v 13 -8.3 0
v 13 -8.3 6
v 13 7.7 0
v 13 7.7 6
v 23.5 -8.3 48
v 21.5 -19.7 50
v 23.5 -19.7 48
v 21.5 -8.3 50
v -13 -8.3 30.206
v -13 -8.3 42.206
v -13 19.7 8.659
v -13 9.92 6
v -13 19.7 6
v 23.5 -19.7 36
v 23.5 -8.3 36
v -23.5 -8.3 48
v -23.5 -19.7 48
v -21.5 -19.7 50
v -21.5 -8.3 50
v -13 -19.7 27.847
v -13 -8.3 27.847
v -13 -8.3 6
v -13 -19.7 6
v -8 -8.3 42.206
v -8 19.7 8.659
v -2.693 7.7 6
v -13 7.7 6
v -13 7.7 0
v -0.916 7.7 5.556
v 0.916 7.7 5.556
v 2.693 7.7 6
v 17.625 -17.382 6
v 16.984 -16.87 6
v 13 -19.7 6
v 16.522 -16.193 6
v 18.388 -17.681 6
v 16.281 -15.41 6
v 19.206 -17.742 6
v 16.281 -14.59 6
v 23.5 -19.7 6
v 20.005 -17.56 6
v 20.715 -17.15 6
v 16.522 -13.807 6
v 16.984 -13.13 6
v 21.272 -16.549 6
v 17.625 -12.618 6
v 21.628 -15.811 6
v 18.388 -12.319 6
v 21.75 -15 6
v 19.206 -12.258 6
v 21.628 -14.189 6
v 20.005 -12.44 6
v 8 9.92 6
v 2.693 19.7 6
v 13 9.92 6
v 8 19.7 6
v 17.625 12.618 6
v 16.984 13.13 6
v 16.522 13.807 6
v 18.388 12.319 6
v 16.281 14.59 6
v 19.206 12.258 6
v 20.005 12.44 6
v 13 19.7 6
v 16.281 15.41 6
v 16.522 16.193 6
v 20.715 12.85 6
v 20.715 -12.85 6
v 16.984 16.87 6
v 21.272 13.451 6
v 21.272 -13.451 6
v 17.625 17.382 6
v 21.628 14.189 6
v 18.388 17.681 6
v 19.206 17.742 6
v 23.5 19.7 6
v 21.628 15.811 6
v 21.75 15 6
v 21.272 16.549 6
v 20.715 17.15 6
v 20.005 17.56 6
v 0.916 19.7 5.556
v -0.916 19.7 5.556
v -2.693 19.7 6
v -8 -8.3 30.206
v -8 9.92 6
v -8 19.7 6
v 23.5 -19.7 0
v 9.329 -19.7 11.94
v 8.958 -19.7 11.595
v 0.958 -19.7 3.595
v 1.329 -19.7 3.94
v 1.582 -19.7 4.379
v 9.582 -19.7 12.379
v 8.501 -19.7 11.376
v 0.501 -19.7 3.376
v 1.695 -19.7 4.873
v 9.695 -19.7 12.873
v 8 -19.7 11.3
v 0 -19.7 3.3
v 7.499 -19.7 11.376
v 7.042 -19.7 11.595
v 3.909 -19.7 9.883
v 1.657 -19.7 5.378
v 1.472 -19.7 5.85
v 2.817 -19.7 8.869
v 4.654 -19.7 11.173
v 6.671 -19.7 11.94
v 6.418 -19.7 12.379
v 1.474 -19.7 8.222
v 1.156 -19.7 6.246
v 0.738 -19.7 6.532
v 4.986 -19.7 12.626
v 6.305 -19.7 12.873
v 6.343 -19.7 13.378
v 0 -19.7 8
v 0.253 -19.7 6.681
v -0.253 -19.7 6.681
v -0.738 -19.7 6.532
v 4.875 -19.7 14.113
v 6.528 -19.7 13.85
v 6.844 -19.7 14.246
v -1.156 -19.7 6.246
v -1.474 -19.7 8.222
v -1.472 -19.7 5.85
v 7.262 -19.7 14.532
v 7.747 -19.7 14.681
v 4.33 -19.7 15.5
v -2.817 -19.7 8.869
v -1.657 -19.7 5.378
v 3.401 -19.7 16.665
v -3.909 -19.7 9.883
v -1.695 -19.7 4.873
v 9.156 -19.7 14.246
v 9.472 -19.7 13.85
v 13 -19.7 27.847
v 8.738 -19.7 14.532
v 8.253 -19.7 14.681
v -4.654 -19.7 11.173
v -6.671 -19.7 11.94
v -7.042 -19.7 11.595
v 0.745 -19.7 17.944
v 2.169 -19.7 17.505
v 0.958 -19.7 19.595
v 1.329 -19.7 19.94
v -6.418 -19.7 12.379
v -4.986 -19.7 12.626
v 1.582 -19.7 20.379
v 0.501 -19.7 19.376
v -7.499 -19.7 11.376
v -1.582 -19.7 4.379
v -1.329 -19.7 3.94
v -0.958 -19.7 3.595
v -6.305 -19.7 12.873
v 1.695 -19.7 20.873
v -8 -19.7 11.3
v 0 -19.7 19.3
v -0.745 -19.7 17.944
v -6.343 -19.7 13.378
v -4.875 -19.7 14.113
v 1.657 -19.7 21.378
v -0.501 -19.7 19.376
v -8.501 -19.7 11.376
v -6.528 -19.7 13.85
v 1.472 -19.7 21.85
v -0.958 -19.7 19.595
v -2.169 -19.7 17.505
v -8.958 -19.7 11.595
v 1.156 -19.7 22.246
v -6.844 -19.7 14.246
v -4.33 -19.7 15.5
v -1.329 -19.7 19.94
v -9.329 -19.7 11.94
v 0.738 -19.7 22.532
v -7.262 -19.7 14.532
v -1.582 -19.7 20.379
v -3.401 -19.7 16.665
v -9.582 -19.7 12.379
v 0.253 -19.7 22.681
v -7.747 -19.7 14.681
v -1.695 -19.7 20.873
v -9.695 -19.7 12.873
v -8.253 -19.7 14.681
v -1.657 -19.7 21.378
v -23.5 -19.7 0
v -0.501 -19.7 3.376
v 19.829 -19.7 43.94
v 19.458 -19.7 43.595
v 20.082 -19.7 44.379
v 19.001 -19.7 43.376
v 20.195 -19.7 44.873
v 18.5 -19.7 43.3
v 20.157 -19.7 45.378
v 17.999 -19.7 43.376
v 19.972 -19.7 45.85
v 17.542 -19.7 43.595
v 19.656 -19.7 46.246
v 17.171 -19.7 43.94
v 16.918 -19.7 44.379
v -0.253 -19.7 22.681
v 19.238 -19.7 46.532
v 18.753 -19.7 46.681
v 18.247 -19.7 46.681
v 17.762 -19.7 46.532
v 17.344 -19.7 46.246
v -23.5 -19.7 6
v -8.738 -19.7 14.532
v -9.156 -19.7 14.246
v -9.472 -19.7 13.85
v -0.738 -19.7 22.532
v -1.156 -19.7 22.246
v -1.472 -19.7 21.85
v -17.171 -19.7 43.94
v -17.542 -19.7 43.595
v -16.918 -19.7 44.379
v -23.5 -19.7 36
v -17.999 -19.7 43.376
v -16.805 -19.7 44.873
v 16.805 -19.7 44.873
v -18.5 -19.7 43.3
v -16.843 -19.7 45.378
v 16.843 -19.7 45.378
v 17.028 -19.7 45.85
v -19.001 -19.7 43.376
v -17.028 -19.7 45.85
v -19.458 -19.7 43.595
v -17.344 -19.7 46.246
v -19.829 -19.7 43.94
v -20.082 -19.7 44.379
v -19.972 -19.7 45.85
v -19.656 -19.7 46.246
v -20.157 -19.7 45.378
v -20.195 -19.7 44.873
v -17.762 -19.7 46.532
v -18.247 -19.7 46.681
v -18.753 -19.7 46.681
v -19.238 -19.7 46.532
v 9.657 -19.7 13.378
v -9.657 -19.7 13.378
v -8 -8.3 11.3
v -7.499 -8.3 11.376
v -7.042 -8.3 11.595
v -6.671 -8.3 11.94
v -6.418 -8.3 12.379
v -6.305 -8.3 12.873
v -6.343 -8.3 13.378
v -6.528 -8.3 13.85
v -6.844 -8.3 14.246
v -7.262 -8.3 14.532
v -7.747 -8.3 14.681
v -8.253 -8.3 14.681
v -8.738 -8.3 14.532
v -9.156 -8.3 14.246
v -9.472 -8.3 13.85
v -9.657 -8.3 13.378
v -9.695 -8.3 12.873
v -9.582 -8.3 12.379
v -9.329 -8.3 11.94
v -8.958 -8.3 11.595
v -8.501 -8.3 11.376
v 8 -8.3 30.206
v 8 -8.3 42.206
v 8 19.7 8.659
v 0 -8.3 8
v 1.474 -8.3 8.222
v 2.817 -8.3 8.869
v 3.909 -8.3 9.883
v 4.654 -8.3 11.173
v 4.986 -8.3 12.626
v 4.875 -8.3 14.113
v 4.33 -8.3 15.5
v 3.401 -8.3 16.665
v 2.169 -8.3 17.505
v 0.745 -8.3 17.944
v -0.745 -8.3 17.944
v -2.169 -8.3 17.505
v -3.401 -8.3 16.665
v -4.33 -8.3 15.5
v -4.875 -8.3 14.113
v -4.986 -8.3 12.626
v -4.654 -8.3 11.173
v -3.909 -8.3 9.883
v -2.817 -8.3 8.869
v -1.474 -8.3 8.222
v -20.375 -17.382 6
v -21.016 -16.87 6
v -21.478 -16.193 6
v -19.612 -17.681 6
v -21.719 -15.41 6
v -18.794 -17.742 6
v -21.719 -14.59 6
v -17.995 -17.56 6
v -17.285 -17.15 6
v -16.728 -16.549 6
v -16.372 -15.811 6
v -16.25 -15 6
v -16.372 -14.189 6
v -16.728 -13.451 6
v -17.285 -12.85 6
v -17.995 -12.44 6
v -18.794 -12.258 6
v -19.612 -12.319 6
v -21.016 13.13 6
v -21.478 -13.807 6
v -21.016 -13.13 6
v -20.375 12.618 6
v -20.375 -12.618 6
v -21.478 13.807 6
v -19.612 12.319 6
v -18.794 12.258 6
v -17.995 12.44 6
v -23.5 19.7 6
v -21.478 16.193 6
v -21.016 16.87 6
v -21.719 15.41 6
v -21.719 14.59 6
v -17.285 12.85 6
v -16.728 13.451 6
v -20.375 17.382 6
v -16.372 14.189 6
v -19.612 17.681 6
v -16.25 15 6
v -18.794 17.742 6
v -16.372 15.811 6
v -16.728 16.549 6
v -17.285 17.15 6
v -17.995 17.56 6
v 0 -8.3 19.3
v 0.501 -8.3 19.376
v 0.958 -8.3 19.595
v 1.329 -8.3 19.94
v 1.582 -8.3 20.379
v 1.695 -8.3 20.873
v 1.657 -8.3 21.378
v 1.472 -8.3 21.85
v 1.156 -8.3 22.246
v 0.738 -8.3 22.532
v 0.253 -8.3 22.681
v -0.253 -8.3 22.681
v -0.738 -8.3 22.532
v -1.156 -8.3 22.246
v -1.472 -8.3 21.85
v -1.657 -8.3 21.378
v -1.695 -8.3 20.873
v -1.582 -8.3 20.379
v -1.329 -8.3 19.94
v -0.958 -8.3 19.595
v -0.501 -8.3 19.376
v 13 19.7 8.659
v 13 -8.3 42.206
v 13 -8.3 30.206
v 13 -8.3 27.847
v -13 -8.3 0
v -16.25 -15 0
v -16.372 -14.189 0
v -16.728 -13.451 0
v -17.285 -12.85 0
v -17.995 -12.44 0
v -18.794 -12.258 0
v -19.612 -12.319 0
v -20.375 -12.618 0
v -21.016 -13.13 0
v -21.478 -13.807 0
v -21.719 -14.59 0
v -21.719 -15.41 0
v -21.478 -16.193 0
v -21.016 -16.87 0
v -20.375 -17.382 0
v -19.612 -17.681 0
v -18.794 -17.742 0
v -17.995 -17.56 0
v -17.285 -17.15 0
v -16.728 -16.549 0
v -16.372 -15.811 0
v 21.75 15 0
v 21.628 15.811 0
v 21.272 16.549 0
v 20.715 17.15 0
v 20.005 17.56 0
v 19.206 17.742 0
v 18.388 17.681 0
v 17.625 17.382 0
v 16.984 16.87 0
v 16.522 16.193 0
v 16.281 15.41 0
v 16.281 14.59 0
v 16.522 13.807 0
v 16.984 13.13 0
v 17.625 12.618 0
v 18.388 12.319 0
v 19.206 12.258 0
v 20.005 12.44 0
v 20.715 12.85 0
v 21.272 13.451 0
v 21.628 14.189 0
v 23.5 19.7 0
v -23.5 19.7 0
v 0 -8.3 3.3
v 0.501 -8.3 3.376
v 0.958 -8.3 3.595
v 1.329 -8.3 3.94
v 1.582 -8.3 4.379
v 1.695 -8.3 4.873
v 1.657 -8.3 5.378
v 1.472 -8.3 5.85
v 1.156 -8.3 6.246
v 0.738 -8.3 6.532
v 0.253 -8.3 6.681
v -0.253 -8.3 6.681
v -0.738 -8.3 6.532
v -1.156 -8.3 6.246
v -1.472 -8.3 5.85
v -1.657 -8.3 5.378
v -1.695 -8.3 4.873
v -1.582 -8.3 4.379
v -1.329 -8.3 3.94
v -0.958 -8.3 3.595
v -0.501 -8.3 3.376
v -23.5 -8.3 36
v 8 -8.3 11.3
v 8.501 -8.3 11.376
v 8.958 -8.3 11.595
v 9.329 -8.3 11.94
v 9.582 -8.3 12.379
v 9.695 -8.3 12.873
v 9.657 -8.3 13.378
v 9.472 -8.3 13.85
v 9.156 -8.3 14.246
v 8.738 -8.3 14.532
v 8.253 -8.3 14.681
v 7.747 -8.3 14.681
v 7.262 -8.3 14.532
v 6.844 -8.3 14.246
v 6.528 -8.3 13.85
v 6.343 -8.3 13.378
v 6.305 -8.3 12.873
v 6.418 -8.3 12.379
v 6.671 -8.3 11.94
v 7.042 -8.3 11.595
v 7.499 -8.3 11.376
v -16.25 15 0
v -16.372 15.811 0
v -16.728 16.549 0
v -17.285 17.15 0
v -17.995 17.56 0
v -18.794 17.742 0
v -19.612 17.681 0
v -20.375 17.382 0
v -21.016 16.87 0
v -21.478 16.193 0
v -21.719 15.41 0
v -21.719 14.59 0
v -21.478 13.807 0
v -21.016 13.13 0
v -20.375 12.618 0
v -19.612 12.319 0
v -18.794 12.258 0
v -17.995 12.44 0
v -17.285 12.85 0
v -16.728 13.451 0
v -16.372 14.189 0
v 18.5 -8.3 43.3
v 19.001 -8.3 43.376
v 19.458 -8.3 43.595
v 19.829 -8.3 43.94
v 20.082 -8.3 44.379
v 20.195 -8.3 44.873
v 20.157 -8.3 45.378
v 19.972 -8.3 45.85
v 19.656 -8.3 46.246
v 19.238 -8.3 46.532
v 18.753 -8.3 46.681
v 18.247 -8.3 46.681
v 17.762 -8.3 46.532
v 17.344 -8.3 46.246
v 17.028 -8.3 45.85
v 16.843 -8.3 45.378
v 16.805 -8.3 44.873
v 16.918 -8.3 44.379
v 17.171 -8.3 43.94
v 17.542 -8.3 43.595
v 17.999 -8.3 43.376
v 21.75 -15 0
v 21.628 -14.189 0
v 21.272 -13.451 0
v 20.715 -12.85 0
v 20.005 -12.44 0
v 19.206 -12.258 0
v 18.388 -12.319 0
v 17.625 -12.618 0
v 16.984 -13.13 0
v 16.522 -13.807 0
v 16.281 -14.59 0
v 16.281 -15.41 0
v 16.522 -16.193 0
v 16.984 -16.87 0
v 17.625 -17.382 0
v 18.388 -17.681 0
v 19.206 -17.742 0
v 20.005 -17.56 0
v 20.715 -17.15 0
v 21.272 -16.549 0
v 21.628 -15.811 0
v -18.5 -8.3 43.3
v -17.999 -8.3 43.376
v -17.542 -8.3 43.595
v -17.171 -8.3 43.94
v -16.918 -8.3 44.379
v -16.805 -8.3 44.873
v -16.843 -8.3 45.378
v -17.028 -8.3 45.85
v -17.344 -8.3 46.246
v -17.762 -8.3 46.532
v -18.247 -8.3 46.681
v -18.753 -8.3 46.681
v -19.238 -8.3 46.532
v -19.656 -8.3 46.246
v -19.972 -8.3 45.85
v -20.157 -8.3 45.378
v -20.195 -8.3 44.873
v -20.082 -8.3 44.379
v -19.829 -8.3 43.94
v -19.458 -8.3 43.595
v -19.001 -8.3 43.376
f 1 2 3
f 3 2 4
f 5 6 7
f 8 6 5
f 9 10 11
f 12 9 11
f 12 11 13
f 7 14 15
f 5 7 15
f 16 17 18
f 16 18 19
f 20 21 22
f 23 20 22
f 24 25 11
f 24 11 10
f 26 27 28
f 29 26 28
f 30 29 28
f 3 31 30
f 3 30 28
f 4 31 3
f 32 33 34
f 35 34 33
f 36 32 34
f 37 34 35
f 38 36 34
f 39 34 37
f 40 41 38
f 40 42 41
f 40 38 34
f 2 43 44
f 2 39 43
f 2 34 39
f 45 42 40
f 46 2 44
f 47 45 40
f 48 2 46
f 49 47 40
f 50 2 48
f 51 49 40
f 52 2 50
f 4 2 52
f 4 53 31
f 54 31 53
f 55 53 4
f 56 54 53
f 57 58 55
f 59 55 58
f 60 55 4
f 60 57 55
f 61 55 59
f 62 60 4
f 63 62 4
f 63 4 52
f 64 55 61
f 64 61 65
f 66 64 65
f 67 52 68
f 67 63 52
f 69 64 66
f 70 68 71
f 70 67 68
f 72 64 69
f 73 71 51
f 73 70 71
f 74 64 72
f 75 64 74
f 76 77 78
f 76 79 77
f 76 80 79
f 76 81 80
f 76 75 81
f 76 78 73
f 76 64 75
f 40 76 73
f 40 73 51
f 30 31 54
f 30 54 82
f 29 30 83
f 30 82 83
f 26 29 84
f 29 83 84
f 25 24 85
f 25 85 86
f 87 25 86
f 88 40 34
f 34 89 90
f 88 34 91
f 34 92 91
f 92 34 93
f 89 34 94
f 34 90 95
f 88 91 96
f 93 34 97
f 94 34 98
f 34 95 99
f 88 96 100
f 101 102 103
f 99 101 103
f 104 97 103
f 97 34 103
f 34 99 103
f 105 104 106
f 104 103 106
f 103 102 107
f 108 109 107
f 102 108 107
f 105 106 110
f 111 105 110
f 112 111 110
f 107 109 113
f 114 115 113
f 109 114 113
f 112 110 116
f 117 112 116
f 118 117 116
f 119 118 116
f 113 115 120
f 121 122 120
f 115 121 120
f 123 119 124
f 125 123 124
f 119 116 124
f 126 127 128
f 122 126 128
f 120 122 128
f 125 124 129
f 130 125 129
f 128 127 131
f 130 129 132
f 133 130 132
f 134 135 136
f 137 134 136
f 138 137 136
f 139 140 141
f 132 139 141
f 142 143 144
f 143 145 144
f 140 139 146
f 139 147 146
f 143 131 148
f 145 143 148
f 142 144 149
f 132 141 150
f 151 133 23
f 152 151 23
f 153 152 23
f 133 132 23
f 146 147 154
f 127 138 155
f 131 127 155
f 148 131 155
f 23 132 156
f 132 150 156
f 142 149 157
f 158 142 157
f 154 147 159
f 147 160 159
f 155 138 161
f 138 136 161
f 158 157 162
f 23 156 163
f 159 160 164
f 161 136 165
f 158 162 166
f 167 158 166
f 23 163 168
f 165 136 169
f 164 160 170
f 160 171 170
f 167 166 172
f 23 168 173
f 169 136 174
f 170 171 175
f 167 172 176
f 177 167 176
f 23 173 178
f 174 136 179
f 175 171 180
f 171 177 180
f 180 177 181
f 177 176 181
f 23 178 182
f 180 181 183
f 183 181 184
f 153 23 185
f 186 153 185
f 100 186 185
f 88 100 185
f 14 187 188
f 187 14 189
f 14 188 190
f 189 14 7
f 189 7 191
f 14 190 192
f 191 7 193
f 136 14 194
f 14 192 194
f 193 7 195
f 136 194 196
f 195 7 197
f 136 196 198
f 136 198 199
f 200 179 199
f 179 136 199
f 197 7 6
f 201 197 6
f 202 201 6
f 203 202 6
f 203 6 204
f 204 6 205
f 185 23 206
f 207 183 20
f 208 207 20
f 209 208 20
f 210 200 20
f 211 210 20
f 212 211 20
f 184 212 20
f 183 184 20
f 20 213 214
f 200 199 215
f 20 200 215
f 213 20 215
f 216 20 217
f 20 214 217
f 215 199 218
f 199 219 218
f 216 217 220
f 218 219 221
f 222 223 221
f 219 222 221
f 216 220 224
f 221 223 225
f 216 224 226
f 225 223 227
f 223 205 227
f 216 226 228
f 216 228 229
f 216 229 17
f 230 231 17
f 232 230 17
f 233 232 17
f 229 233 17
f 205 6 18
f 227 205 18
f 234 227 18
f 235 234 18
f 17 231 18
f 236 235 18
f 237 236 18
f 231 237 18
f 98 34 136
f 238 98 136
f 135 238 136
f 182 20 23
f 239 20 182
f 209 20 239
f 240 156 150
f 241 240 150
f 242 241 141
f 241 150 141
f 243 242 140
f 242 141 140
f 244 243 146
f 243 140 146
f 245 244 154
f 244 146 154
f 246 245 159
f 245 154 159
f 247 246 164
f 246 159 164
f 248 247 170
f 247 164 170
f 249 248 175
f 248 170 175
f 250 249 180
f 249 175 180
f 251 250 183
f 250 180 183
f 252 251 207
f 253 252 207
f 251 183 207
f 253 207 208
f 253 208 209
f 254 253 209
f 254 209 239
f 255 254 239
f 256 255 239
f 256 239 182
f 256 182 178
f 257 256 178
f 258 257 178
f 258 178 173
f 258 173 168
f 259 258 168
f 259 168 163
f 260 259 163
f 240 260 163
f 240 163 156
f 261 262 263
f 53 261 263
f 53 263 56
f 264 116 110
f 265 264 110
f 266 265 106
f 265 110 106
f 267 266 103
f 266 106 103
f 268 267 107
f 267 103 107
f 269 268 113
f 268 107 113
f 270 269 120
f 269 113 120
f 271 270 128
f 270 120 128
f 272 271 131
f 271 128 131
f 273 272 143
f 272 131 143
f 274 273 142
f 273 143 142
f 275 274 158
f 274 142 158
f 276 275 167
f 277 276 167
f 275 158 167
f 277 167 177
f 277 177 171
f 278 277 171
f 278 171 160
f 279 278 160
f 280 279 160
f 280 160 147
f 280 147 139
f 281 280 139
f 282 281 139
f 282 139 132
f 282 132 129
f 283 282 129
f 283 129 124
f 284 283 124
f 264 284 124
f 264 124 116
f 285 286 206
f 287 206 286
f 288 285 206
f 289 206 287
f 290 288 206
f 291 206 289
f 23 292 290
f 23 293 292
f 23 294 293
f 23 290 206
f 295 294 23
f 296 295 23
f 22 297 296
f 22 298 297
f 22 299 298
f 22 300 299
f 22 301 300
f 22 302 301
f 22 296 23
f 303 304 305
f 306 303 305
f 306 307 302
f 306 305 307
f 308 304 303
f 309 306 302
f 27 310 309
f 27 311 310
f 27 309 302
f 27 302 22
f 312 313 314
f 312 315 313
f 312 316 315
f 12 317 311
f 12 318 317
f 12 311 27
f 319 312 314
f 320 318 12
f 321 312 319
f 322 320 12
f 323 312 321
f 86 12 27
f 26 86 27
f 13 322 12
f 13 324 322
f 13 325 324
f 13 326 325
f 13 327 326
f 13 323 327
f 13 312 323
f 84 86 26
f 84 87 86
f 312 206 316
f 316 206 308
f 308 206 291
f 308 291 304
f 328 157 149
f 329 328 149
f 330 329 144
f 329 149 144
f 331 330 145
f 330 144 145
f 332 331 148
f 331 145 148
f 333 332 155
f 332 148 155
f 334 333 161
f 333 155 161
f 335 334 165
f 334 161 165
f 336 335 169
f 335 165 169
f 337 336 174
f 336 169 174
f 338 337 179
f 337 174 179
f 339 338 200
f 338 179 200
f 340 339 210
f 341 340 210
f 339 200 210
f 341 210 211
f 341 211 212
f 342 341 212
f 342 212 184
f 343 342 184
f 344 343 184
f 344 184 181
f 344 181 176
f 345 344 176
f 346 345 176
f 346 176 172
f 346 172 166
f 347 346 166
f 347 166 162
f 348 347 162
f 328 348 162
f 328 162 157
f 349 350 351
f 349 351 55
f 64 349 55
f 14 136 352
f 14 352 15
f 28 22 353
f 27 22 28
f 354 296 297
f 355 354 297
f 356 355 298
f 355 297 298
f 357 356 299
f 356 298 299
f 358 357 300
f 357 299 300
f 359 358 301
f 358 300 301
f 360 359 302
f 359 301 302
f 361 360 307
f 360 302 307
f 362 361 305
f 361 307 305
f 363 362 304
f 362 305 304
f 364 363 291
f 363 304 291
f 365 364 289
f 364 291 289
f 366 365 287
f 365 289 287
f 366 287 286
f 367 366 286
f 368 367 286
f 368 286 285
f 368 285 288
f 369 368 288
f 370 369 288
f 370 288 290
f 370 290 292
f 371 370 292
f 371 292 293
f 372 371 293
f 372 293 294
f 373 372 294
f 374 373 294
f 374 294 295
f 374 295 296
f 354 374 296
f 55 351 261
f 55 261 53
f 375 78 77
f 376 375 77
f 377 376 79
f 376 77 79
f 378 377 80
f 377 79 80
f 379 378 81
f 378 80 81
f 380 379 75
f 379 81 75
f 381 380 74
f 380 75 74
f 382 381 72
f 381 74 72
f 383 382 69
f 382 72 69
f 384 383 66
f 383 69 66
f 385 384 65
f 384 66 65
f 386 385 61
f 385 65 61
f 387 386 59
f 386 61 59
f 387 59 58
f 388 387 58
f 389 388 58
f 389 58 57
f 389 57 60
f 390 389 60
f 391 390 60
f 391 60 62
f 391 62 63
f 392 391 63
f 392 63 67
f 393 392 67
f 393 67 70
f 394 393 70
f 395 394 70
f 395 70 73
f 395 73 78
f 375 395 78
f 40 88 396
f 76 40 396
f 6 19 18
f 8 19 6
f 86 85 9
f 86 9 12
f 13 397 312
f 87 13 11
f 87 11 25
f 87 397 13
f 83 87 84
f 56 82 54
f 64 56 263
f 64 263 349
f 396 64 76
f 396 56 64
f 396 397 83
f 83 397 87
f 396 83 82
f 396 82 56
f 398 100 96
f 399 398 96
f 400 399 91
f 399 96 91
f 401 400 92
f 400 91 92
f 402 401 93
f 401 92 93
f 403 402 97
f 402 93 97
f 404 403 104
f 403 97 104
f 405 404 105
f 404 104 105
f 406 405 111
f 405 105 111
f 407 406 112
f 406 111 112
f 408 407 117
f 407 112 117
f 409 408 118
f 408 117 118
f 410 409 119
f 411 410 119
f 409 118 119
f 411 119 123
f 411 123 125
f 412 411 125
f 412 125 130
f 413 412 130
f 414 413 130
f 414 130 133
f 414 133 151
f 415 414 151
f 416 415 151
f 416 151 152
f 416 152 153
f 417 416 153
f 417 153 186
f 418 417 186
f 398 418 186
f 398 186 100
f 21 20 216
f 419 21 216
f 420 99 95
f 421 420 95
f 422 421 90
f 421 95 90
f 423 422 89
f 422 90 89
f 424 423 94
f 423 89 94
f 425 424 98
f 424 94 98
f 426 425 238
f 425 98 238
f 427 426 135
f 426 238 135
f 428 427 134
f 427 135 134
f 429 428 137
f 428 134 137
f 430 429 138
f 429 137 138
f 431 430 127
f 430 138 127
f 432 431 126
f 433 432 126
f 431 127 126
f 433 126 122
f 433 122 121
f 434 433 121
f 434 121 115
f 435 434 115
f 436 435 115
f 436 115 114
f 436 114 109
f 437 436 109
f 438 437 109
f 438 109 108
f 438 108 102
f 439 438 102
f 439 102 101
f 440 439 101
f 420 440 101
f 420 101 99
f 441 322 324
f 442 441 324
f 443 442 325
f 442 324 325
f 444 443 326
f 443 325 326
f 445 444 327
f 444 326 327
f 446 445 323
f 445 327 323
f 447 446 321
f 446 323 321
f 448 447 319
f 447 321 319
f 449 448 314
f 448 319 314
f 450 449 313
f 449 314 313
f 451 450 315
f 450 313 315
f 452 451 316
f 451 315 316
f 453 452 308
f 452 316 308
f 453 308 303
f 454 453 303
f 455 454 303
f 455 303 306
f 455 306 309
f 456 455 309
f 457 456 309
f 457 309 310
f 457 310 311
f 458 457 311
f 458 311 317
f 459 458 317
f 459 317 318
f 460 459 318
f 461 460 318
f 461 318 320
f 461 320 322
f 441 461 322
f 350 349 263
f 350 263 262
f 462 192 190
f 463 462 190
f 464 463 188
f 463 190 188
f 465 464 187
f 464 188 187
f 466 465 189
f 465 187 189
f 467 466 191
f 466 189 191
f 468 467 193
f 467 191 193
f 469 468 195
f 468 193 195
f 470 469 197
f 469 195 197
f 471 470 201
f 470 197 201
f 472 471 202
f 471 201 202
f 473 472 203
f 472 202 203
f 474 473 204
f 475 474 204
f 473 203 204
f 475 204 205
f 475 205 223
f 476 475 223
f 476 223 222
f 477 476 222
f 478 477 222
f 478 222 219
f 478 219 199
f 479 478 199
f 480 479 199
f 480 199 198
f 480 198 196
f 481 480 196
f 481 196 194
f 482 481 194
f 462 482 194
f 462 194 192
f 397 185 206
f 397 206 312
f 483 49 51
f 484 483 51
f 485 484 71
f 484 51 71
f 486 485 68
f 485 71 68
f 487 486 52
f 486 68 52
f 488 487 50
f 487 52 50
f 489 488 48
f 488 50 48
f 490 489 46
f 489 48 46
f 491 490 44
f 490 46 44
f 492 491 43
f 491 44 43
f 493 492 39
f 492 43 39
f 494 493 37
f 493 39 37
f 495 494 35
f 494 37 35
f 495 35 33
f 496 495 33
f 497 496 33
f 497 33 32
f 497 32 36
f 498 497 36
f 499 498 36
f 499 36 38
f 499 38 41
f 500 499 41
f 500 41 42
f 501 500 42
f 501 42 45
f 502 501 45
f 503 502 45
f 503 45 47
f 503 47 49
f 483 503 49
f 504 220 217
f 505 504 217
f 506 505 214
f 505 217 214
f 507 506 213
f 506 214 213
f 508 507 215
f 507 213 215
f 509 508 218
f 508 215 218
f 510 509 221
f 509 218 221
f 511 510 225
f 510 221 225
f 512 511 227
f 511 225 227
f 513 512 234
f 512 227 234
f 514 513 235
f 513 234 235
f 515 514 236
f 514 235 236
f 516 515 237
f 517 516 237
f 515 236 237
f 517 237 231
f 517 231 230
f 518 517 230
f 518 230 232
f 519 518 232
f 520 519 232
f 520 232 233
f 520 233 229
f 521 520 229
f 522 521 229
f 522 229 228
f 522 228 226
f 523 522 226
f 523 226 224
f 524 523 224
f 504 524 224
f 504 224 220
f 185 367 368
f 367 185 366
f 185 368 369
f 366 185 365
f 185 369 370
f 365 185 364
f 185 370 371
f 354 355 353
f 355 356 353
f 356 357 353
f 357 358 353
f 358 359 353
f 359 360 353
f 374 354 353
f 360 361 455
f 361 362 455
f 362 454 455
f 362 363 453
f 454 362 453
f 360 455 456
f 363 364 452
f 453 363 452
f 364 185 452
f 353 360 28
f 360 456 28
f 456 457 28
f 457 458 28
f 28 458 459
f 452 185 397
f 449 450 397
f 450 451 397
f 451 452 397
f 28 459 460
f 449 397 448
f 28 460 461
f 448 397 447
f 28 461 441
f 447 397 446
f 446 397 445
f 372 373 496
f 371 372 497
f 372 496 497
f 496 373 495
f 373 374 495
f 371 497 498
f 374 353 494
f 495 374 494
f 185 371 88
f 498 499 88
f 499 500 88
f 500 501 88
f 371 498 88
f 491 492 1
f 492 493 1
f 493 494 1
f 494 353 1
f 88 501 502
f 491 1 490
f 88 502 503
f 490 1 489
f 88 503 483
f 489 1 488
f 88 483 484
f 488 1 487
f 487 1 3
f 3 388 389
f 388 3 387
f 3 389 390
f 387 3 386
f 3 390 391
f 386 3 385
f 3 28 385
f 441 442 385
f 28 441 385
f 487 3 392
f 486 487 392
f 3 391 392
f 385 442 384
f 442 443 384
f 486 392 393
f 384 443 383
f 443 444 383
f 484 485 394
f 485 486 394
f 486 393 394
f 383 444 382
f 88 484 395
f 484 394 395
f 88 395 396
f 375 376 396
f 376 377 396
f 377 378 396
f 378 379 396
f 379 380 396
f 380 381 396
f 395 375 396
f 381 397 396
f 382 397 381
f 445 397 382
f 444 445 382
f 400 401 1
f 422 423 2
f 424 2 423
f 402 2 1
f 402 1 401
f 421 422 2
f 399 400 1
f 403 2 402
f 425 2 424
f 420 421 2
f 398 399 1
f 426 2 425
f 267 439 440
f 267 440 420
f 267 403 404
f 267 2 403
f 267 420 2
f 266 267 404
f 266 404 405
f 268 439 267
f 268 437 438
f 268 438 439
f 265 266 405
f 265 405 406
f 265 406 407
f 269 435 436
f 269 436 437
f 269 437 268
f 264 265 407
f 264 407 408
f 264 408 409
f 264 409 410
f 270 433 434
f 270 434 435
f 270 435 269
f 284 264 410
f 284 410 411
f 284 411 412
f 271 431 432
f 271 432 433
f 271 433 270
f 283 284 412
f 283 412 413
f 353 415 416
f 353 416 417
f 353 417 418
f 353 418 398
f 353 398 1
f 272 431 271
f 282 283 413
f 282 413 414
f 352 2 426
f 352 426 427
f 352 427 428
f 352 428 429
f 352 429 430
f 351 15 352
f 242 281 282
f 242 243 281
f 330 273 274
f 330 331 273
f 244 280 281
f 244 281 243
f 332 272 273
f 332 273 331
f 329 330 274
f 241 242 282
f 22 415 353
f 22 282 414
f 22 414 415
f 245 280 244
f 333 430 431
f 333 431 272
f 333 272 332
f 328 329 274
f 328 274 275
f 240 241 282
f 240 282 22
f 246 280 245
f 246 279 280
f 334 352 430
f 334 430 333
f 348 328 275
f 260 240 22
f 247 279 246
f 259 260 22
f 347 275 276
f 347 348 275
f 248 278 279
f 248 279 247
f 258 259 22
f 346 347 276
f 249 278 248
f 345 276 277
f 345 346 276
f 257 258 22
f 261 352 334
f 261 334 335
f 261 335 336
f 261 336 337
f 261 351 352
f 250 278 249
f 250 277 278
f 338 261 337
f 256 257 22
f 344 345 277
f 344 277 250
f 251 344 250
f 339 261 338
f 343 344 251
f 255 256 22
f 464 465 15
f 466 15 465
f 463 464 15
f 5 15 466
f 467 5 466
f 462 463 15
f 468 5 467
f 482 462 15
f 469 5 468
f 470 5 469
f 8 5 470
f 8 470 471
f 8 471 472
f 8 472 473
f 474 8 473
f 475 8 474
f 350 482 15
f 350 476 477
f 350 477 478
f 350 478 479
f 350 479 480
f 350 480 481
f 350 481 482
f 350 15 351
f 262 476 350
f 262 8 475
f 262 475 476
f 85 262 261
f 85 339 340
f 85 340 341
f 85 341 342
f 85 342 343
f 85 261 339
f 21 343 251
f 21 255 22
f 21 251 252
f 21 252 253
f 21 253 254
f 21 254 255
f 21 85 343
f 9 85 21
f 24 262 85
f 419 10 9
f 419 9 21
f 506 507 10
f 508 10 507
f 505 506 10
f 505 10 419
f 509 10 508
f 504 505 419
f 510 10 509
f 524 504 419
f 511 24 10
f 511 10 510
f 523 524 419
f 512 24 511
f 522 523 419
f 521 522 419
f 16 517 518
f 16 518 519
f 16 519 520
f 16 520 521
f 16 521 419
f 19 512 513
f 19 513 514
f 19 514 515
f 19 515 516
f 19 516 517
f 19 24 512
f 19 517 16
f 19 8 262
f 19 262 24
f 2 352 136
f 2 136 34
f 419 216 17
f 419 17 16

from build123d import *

# Parameters (mm, degrees)
SKETCH1_W                = 47
SKETCH1_H                = 39.4
BOSS_EXTRUDE1_DEPTH      = 50
SKETCH3_W                = 10.5
SKETCH3_H                = 30
CUT_EXTRUDE1_DEPTH       = 50
SKETCH19_R               = 5
CUT_EXTRUDE6_DEPTH       = 68.857276692
M5_CLEARANCE_HOLE1_D     = 5.5
M5_CLEARANCE_HOLE1_DEPTH = 6
SKETCH25_R               = 7.5
CUT_EXTRUDE7_DEPTH       = 28
CUT_EXTRUDE8_DEPTH       = 28
SKETCH27_W               = 26
SKETCH27_H               = 16
CUT_EXTRUDE9_DEPTH       = 28
CUT_EXTRUDE10_REACH      = 69.857
SKETCH28_R               = 1.7
BOSS_EXTRUDE2_DEPTH      = 26
SKETCH30_W               = 16
SKETCH30_H               = 41.736735488
CUT_EXTRUDE11_DEPTH      = 28
BOSS_EXTRUDE3_DEPTH      = 11.4
CHAMFER1_SIZE            = 2


with BuildPart() as part:
    # Sketch1 → Boss-Extrude1 (new body)
    with BuildSketch(Plane.XY):
        Rectangle(SKETCH1_W, SKETCH1_H)
    extrude(amount=BOSS_EXTRUDE1_DEPTH)

    # Sketch3 → Cut-Extrude1 (cut)
    with BuildSketch(Plane(origin=(0, 19.7, 0), x_dir=(1, 0, 0), z_dir=(0, 1, 0))):
        with Locations((18.25, -21)):
            Rectangle(SKETCH3_W, SKETCH3_H)
        with Locations((-18.25, -21)):
            Rectangle(SKETCH3_W, SKETCH3_H)
    extrude(amount=-CUT_EXTRUDE1_DEPTH, mode=Mode.SUBTRACT)

    # Sketch19 → Cut-Extrude6 (cut, through all)
    with BuildSketch(Plane.XZ.offset(19.7)):
        with Locations(Location((0, 13, 0), (0, 0, 270))):
            Circle(SKETCH19_R)
    extrude(amount=-CUT_EXTRUDE6_DEPTH, mode=Mode.SUBTRACT)

    # M5 Clearance Hole1
    with Locations(Plane(origin=(0, 0, 0), x_dir=(-1, 0, 0), z_dir=(0, 0, -1))):
        with Locations((-19, -15), (-19, 15), (19, 15), (19, -15)):
            Hole(M5_CLEARANCE_HOLE1_D / 2, depth=M5_CLEARANCE_HOLE1_DEPTH)

    # Sketch25 → Cut-Extrude7 (cut)
    with BuildSketch(Plane(origin=(0, 19.7, 0), x_dir=(1, 0, 0), z_dir=(0, 1, 0))):
        with Locations(Location((0, -13, 0), (0, 0, 270))):
            Circle(SKETCH25_R)
    extrude(amount=-CUT_EXTRUDE7_DEPTH, mode=Mode.SUBTRACT)

    # Sketch26 → Cut-Extrude8 (cut)
    with BuildSketch(Plane(origin=(0, 19.7, 0), x_dir=(1, 0, 0), z_dir=(0, 1, 0))):
        Polygon((13, -6), (13, -36), (23.5, -36), (23.5, -50), (-23.5, -50), (-23.5, -36), (-13, -36), (-13, -6), align=None)
    extrude(amount=-CUT_EXTRUDE8_DEPTH, mode=Mode.SUBTRACT)

    # Sketch27 → Cut-Extrude9 (cut)
    with BuildSketch(Plane.XY.offset(6)):
        with Locations((0, -0.3)):
            Rectangle(SKETCH27_W, SKETCH27_H)
    extrude(amount=-CUT_EXTRUDE9_DEPTH, mode=Mode.SUBTRACT)

    # Sketch28 → Cut-Extrude10 (cut, up to next)
    with BuildSketch(Plane.XZ.offset(19.7), mode=Mode.PRIVATE) as cut_extrude10_sk1:
        with Locations(Location((0, 21, 0), (0, 0, 270))):
            Circle(SKETCH28_R)
    cut_extrude10_tool1 = extrude(cut_extrude10_sk1.sketch, amount=-CUT_EXTRUDE10_REACH, mode=Mode.PRIVATE) & part.part
    # Sketch28 → Cut-Extrude10 (cut, up to next)
    with BuildSketch(Plane.XZ.offset(19.7), mode=Mode.PRIVATE) as cut_extrude10_sk2:
        with Locations(Location((8, 13, 0), (0, 0, 270))):
            Circle(SKETCH28_R)
    cut_extrude10_tool2 = extrude(cut_extrude10_sk2.sketch, amount=-CUT_EXTRUDE10_REACH, mode=Mode.PRIVATE) & part.part
    # Sketch28 → Cut-Extrude10 (cut, up to next)
    with BuildSketch(Plane.XZ.offset(19.7), mode=Mode.PRIVATE) as cut_extrude10_sk3:
        with Locations(Location((0, 5, 0), (0, 0, 270))):
            Circle(SKETCH28_R)
    cut_extrude10_tool3 = extrude(cut_extrude10_sk3.sketch, amount=-CUT_EXTRUDE10_REACH, mode=Mode.PRIVATE) & part.part
    # Sketch28 → Cut-Extrude10 (cut, up to next)
    with BuildSketch(Plane.XZ.offset(19.7), mode=Mode.PRIVATE) as cut_extrude10_sk4:
        with Locations(Location((-8, 13, 0), (0, 0, 270))):
            Circle(SKETCH28_R)
    cut_extrude10_tool4 = extrude(cut_extrude10_sk4.sketch, amount=-CUT_EXTRUDE10_REACH, mode=Mode.PRIVATE) & part.part
    # Sketch28 → Cut-Extrude10 (cut, up to next)
    with BuildSketch(Plane.XZ.offset(19.7), mode=Mode.PRIVATE) as cut_extrude10_sk5:
        with Locations(Location((-18.5, 45, 0), (0, 0, 270))):
            Circle(SKETCH28_R)
    cut_extrude10_tool5 = extrude(cut_extrude10_sk5.sketch, amount=-CUT_EXTRUDE10_REACH, mode=Mode.PRIVATE) & part.part
    # Sketch28 → Cut-Extrude10 (cut, up to next)
    with BuildSketch(Plane.XZ.offset(19.7), mode=Mode.PRIVATE) as cut_extrude10_sk6:
        with Locations(Location((18.5, 45, 0), (0, 0, 270))):
            Circle(SKETCH28_R)
    cut_extrude10_tool6 = extrude(cut_extrude10_sk6.sketch, amount=-CUT_EXTRUDE10_REACH, mode=Mode.PRIVATE) & part.part
    add(cut_extrude10_tool1.solids().sort_by_distance((0, -19.7, 21))[0], mode=Mode.SUBTRACT)
    add(cut_extrude10_tool2.solids().sort_by_distance((8, -19.7, 13))[0], mode=Mode.SUBTRACT)
    add(cut_extrude10_tool3.solids().sort_by_distance((0, -19.7, 5))[0], mode=Mode.SUBTRACT)
    add(cut_extrude10_tool4.solids().sort_by_distance((-8, -19.7, 13))[0], mode=Mode.SUBTRACT)
    add(cut_extrude10_tool5.solids().sort_by_distance((-18.5, -19.7, 45))[0], mode=Mode.SUBTRACT)
    add(cut_extrude10_tool6.solids().sort_by_distance((18.5, -19.7, 45))[0], mode=Mode.SUBTRACT)

    # Sketch29 → Boss-Extrude2 (add)
    with BuildSketch(Plane(origin=(13, 0, 0), x_dir=(0, 0, -1), z_dir=(1, 0, 0))):
        Polygon((-42.205748108, -8.3), (-30.205748108, -8.3), (-6, 9.919793382), (-6, 19.7), (-8.659491381, 19.7), align=None)
    extrude(amount=-BOSS_EXTRUDE2_DEPTH)

    # Sketch30 → Cut-Extrude11 (cut)
    with BuildSketch(Plane(origin=(0, 19.7, 0), x_dir=(1, 0, 0), z_dir=(0, 1, 0))):
        with Locations((0, -26.868367744)):
            Rectangle(SKETCH30_W, SKETCH30_H)
    extrude(amount=-CUT_EXTRUDE11_DEPTH, mode=Mode.SUBTRACT)

    # Sketch31 → Boss-Extrude3 (add)
    with BuildSketch(Plane.XZ.offset(19.7)):
        Polygon((-23.5, 36), (-13, 36), (-13, 27.846939537), align=None)
        Polygon((13, 36), (13, 27.846939537), (23.5, 36), align=None)
    extrude(amount=-BOSS_EXTRUDE3_DEPTH)

    # Chamfer1
    chamfer1_edges = [part.edges().sort_by_distance(p)[0] for p in [
        (23.5, -14, 50),
        (-23.5, -14, 50),
    ]]
    chamfer(chamfer1_edges, length=CHAMFER1_SIZE)


solid = part.part
